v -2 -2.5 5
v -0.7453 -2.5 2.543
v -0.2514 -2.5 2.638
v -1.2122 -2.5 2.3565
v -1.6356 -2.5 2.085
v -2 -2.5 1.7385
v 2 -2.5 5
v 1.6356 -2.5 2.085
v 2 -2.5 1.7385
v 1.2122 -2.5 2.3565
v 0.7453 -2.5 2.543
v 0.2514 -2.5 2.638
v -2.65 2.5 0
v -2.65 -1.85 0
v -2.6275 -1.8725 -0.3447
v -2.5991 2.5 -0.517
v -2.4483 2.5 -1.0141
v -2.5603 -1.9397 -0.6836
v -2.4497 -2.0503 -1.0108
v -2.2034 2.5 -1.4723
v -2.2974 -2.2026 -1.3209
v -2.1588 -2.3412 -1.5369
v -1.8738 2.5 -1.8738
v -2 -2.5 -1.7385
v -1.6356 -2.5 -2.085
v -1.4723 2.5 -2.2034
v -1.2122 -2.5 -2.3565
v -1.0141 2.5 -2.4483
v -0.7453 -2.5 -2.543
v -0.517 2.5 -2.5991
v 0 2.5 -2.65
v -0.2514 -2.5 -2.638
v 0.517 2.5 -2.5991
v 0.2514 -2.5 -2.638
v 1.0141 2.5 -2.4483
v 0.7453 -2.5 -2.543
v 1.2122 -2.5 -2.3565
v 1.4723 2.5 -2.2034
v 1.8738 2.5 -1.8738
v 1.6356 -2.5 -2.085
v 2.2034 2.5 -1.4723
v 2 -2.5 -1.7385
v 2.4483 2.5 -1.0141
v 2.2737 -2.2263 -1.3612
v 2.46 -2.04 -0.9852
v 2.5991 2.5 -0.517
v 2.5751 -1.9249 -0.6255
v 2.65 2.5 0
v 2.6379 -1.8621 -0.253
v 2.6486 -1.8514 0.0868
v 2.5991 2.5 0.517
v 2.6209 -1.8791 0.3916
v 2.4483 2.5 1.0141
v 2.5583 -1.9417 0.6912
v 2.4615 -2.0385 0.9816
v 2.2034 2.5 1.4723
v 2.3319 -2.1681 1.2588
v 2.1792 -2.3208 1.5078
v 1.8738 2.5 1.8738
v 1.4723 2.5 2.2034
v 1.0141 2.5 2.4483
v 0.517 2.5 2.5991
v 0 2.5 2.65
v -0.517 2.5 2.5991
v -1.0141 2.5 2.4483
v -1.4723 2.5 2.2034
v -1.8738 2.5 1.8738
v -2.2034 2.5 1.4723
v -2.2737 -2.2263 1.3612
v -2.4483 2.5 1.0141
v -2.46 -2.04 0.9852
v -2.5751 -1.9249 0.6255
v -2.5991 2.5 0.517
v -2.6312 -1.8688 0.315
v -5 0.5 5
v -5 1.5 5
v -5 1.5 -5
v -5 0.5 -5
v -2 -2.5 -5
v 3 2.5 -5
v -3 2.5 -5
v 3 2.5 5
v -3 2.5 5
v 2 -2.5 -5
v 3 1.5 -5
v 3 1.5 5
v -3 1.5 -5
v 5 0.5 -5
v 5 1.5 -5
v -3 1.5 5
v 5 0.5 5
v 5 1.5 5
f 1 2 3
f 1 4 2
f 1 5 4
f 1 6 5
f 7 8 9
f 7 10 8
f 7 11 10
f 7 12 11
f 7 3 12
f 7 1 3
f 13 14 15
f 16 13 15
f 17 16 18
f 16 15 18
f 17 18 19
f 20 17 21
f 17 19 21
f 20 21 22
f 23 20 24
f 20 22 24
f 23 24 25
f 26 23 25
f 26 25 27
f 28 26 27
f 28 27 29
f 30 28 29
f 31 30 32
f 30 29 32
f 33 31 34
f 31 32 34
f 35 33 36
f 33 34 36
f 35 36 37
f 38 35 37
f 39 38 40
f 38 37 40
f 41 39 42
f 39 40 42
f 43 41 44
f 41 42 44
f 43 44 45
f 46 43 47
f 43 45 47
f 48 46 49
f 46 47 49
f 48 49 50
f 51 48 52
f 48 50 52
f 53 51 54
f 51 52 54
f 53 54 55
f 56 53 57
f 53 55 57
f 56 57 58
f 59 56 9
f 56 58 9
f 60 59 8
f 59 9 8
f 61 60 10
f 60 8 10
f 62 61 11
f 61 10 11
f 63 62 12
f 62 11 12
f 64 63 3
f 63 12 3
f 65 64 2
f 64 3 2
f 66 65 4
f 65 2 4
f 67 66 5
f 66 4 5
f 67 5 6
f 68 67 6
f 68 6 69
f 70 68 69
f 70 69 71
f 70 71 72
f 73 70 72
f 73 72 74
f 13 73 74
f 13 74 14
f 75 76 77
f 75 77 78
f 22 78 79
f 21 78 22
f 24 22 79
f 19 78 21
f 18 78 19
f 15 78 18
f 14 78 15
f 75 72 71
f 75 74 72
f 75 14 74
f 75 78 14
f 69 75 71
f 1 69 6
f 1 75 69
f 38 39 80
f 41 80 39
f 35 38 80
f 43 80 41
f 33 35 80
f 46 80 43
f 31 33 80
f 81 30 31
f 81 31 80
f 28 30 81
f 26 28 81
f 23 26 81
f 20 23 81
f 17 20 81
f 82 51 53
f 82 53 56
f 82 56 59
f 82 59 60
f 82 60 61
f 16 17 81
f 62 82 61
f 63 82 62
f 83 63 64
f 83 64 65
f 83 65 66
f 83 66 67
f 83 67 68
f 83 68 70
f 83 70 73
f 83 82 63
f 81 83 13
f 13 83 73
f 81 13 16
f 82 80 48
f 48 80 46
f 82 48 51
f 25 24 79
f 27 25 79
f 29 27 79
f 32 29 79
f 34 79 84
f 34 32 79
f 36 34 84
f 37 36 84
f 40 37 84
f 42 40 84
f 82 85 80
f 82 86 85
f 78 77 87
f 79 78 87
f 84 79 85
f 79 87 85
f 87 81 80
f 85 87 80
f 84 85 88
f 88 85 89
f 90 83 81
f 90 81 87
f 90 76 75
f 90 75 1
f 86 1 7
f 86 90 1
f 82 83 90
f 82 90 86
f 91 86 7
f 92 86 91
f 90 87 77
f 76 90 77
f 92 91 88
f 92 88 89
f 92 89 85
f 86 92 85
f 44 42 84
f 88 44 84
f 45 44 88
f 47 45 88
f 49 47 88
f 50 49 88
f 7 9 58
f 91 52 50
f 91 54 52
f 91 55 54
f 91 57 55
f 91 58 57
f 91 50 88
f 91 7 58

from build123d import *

# Parameters (mm, degrees)
BOSS_EXTRUDE1_DEPTH      = 5
BOSS_EXTRUDE1_DEPTH_BACK = 5
M5_CLEARANCE_HOLE1_D     = 5.3
M5_CLEARANCE_HOLE1_DEPTH = 23.08
M5_CLEARANCE_HOLE1_TIP   = 1.59228064


with BuildPart() as part:
    # Sketch1 → Boss-Extrude1 (new, two sides: drawn at the far end of the back side and taken through both)
    with BuildSketch(Plane.XY.offset(-BOSS_EXTRUDE1_DEPTH_BACK)):
        Polygon((3, 2.5), (-3, 2.5), (-3, 1.5), (-5, 1.5), (-5, 0.5), (-2, -2.5), (2, -2.5), (5, 0.5), (5, 1.5), (3, 1.5), align=None)
    extrude(amount=BOSS_EXTRUDE1_DEPTH + BOSS_EXTRUDE1_DEPTH_BACK)

    # M5 Clearance Hole1
    with Locations(Plane(origin=(0, 2.5, 0), x_dir=(1, 0, 0), z_dir=(0, 1, 0))):
        with Locations((0, 0)):
            Hole(M5_CLEARANCE_HOLE1_D / 2, depth=M5_CLEARANCE_HOLE1_DEPTH)
            with Locations((0, 0, -(M5_CLEARANCE_HOLE1_DEPTH + M5_CLEARANCE_HOLE1_TIP / 2))):  # 118° drill point
                Cone(0, M5_CLEARANCE_HOLE1_D / 2, M5_CLEARANCE_HOLE1_TIP, mode=Mode.SUBTRACT)


solid = part.part
